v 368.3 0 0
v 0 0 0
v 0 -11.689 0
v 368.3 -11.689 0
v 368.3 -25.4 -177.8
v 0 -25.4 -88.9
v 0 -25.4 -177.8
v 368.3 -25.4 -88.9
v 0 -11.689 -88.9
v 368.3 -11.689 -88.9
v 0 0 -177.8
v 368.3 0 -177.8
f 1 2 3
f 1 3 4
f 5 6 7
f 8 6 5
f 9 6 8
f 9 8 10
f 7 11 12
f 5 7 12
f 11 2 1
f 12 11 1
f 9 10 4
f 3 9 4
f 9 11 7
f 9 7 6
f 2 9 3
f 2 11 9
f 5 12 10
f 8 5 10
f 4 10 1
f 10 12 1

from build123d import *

# Parameters (mm, degrees)
F0_W     = 368.3
F0_H     = 177.8
F1_DEPTH = 25.4
F2_W     = 97.073552
F2_H     = 88.9
F3_DEPTH = 368.3


with BuildPart() as f1:
    # F0 (on Front) → F1 (new body)
    with BuildSketch(Plane.XZ):
        with Locations((184.15, -88.9)):
            Rectangle(F0_W, F0_H)
    extrude(amount=F1_DEPTH)

    # F2 (on Right) → F3 (cut)
    with BuildSketch(Plane.YZ):
        with Locations((-60.2259, -44.45)):
            Rectangle(F2_W, F2_H)
    extrude(amount=F3_DEPTH, mode=Mode.SUBTRACT)


solid = f1.part
